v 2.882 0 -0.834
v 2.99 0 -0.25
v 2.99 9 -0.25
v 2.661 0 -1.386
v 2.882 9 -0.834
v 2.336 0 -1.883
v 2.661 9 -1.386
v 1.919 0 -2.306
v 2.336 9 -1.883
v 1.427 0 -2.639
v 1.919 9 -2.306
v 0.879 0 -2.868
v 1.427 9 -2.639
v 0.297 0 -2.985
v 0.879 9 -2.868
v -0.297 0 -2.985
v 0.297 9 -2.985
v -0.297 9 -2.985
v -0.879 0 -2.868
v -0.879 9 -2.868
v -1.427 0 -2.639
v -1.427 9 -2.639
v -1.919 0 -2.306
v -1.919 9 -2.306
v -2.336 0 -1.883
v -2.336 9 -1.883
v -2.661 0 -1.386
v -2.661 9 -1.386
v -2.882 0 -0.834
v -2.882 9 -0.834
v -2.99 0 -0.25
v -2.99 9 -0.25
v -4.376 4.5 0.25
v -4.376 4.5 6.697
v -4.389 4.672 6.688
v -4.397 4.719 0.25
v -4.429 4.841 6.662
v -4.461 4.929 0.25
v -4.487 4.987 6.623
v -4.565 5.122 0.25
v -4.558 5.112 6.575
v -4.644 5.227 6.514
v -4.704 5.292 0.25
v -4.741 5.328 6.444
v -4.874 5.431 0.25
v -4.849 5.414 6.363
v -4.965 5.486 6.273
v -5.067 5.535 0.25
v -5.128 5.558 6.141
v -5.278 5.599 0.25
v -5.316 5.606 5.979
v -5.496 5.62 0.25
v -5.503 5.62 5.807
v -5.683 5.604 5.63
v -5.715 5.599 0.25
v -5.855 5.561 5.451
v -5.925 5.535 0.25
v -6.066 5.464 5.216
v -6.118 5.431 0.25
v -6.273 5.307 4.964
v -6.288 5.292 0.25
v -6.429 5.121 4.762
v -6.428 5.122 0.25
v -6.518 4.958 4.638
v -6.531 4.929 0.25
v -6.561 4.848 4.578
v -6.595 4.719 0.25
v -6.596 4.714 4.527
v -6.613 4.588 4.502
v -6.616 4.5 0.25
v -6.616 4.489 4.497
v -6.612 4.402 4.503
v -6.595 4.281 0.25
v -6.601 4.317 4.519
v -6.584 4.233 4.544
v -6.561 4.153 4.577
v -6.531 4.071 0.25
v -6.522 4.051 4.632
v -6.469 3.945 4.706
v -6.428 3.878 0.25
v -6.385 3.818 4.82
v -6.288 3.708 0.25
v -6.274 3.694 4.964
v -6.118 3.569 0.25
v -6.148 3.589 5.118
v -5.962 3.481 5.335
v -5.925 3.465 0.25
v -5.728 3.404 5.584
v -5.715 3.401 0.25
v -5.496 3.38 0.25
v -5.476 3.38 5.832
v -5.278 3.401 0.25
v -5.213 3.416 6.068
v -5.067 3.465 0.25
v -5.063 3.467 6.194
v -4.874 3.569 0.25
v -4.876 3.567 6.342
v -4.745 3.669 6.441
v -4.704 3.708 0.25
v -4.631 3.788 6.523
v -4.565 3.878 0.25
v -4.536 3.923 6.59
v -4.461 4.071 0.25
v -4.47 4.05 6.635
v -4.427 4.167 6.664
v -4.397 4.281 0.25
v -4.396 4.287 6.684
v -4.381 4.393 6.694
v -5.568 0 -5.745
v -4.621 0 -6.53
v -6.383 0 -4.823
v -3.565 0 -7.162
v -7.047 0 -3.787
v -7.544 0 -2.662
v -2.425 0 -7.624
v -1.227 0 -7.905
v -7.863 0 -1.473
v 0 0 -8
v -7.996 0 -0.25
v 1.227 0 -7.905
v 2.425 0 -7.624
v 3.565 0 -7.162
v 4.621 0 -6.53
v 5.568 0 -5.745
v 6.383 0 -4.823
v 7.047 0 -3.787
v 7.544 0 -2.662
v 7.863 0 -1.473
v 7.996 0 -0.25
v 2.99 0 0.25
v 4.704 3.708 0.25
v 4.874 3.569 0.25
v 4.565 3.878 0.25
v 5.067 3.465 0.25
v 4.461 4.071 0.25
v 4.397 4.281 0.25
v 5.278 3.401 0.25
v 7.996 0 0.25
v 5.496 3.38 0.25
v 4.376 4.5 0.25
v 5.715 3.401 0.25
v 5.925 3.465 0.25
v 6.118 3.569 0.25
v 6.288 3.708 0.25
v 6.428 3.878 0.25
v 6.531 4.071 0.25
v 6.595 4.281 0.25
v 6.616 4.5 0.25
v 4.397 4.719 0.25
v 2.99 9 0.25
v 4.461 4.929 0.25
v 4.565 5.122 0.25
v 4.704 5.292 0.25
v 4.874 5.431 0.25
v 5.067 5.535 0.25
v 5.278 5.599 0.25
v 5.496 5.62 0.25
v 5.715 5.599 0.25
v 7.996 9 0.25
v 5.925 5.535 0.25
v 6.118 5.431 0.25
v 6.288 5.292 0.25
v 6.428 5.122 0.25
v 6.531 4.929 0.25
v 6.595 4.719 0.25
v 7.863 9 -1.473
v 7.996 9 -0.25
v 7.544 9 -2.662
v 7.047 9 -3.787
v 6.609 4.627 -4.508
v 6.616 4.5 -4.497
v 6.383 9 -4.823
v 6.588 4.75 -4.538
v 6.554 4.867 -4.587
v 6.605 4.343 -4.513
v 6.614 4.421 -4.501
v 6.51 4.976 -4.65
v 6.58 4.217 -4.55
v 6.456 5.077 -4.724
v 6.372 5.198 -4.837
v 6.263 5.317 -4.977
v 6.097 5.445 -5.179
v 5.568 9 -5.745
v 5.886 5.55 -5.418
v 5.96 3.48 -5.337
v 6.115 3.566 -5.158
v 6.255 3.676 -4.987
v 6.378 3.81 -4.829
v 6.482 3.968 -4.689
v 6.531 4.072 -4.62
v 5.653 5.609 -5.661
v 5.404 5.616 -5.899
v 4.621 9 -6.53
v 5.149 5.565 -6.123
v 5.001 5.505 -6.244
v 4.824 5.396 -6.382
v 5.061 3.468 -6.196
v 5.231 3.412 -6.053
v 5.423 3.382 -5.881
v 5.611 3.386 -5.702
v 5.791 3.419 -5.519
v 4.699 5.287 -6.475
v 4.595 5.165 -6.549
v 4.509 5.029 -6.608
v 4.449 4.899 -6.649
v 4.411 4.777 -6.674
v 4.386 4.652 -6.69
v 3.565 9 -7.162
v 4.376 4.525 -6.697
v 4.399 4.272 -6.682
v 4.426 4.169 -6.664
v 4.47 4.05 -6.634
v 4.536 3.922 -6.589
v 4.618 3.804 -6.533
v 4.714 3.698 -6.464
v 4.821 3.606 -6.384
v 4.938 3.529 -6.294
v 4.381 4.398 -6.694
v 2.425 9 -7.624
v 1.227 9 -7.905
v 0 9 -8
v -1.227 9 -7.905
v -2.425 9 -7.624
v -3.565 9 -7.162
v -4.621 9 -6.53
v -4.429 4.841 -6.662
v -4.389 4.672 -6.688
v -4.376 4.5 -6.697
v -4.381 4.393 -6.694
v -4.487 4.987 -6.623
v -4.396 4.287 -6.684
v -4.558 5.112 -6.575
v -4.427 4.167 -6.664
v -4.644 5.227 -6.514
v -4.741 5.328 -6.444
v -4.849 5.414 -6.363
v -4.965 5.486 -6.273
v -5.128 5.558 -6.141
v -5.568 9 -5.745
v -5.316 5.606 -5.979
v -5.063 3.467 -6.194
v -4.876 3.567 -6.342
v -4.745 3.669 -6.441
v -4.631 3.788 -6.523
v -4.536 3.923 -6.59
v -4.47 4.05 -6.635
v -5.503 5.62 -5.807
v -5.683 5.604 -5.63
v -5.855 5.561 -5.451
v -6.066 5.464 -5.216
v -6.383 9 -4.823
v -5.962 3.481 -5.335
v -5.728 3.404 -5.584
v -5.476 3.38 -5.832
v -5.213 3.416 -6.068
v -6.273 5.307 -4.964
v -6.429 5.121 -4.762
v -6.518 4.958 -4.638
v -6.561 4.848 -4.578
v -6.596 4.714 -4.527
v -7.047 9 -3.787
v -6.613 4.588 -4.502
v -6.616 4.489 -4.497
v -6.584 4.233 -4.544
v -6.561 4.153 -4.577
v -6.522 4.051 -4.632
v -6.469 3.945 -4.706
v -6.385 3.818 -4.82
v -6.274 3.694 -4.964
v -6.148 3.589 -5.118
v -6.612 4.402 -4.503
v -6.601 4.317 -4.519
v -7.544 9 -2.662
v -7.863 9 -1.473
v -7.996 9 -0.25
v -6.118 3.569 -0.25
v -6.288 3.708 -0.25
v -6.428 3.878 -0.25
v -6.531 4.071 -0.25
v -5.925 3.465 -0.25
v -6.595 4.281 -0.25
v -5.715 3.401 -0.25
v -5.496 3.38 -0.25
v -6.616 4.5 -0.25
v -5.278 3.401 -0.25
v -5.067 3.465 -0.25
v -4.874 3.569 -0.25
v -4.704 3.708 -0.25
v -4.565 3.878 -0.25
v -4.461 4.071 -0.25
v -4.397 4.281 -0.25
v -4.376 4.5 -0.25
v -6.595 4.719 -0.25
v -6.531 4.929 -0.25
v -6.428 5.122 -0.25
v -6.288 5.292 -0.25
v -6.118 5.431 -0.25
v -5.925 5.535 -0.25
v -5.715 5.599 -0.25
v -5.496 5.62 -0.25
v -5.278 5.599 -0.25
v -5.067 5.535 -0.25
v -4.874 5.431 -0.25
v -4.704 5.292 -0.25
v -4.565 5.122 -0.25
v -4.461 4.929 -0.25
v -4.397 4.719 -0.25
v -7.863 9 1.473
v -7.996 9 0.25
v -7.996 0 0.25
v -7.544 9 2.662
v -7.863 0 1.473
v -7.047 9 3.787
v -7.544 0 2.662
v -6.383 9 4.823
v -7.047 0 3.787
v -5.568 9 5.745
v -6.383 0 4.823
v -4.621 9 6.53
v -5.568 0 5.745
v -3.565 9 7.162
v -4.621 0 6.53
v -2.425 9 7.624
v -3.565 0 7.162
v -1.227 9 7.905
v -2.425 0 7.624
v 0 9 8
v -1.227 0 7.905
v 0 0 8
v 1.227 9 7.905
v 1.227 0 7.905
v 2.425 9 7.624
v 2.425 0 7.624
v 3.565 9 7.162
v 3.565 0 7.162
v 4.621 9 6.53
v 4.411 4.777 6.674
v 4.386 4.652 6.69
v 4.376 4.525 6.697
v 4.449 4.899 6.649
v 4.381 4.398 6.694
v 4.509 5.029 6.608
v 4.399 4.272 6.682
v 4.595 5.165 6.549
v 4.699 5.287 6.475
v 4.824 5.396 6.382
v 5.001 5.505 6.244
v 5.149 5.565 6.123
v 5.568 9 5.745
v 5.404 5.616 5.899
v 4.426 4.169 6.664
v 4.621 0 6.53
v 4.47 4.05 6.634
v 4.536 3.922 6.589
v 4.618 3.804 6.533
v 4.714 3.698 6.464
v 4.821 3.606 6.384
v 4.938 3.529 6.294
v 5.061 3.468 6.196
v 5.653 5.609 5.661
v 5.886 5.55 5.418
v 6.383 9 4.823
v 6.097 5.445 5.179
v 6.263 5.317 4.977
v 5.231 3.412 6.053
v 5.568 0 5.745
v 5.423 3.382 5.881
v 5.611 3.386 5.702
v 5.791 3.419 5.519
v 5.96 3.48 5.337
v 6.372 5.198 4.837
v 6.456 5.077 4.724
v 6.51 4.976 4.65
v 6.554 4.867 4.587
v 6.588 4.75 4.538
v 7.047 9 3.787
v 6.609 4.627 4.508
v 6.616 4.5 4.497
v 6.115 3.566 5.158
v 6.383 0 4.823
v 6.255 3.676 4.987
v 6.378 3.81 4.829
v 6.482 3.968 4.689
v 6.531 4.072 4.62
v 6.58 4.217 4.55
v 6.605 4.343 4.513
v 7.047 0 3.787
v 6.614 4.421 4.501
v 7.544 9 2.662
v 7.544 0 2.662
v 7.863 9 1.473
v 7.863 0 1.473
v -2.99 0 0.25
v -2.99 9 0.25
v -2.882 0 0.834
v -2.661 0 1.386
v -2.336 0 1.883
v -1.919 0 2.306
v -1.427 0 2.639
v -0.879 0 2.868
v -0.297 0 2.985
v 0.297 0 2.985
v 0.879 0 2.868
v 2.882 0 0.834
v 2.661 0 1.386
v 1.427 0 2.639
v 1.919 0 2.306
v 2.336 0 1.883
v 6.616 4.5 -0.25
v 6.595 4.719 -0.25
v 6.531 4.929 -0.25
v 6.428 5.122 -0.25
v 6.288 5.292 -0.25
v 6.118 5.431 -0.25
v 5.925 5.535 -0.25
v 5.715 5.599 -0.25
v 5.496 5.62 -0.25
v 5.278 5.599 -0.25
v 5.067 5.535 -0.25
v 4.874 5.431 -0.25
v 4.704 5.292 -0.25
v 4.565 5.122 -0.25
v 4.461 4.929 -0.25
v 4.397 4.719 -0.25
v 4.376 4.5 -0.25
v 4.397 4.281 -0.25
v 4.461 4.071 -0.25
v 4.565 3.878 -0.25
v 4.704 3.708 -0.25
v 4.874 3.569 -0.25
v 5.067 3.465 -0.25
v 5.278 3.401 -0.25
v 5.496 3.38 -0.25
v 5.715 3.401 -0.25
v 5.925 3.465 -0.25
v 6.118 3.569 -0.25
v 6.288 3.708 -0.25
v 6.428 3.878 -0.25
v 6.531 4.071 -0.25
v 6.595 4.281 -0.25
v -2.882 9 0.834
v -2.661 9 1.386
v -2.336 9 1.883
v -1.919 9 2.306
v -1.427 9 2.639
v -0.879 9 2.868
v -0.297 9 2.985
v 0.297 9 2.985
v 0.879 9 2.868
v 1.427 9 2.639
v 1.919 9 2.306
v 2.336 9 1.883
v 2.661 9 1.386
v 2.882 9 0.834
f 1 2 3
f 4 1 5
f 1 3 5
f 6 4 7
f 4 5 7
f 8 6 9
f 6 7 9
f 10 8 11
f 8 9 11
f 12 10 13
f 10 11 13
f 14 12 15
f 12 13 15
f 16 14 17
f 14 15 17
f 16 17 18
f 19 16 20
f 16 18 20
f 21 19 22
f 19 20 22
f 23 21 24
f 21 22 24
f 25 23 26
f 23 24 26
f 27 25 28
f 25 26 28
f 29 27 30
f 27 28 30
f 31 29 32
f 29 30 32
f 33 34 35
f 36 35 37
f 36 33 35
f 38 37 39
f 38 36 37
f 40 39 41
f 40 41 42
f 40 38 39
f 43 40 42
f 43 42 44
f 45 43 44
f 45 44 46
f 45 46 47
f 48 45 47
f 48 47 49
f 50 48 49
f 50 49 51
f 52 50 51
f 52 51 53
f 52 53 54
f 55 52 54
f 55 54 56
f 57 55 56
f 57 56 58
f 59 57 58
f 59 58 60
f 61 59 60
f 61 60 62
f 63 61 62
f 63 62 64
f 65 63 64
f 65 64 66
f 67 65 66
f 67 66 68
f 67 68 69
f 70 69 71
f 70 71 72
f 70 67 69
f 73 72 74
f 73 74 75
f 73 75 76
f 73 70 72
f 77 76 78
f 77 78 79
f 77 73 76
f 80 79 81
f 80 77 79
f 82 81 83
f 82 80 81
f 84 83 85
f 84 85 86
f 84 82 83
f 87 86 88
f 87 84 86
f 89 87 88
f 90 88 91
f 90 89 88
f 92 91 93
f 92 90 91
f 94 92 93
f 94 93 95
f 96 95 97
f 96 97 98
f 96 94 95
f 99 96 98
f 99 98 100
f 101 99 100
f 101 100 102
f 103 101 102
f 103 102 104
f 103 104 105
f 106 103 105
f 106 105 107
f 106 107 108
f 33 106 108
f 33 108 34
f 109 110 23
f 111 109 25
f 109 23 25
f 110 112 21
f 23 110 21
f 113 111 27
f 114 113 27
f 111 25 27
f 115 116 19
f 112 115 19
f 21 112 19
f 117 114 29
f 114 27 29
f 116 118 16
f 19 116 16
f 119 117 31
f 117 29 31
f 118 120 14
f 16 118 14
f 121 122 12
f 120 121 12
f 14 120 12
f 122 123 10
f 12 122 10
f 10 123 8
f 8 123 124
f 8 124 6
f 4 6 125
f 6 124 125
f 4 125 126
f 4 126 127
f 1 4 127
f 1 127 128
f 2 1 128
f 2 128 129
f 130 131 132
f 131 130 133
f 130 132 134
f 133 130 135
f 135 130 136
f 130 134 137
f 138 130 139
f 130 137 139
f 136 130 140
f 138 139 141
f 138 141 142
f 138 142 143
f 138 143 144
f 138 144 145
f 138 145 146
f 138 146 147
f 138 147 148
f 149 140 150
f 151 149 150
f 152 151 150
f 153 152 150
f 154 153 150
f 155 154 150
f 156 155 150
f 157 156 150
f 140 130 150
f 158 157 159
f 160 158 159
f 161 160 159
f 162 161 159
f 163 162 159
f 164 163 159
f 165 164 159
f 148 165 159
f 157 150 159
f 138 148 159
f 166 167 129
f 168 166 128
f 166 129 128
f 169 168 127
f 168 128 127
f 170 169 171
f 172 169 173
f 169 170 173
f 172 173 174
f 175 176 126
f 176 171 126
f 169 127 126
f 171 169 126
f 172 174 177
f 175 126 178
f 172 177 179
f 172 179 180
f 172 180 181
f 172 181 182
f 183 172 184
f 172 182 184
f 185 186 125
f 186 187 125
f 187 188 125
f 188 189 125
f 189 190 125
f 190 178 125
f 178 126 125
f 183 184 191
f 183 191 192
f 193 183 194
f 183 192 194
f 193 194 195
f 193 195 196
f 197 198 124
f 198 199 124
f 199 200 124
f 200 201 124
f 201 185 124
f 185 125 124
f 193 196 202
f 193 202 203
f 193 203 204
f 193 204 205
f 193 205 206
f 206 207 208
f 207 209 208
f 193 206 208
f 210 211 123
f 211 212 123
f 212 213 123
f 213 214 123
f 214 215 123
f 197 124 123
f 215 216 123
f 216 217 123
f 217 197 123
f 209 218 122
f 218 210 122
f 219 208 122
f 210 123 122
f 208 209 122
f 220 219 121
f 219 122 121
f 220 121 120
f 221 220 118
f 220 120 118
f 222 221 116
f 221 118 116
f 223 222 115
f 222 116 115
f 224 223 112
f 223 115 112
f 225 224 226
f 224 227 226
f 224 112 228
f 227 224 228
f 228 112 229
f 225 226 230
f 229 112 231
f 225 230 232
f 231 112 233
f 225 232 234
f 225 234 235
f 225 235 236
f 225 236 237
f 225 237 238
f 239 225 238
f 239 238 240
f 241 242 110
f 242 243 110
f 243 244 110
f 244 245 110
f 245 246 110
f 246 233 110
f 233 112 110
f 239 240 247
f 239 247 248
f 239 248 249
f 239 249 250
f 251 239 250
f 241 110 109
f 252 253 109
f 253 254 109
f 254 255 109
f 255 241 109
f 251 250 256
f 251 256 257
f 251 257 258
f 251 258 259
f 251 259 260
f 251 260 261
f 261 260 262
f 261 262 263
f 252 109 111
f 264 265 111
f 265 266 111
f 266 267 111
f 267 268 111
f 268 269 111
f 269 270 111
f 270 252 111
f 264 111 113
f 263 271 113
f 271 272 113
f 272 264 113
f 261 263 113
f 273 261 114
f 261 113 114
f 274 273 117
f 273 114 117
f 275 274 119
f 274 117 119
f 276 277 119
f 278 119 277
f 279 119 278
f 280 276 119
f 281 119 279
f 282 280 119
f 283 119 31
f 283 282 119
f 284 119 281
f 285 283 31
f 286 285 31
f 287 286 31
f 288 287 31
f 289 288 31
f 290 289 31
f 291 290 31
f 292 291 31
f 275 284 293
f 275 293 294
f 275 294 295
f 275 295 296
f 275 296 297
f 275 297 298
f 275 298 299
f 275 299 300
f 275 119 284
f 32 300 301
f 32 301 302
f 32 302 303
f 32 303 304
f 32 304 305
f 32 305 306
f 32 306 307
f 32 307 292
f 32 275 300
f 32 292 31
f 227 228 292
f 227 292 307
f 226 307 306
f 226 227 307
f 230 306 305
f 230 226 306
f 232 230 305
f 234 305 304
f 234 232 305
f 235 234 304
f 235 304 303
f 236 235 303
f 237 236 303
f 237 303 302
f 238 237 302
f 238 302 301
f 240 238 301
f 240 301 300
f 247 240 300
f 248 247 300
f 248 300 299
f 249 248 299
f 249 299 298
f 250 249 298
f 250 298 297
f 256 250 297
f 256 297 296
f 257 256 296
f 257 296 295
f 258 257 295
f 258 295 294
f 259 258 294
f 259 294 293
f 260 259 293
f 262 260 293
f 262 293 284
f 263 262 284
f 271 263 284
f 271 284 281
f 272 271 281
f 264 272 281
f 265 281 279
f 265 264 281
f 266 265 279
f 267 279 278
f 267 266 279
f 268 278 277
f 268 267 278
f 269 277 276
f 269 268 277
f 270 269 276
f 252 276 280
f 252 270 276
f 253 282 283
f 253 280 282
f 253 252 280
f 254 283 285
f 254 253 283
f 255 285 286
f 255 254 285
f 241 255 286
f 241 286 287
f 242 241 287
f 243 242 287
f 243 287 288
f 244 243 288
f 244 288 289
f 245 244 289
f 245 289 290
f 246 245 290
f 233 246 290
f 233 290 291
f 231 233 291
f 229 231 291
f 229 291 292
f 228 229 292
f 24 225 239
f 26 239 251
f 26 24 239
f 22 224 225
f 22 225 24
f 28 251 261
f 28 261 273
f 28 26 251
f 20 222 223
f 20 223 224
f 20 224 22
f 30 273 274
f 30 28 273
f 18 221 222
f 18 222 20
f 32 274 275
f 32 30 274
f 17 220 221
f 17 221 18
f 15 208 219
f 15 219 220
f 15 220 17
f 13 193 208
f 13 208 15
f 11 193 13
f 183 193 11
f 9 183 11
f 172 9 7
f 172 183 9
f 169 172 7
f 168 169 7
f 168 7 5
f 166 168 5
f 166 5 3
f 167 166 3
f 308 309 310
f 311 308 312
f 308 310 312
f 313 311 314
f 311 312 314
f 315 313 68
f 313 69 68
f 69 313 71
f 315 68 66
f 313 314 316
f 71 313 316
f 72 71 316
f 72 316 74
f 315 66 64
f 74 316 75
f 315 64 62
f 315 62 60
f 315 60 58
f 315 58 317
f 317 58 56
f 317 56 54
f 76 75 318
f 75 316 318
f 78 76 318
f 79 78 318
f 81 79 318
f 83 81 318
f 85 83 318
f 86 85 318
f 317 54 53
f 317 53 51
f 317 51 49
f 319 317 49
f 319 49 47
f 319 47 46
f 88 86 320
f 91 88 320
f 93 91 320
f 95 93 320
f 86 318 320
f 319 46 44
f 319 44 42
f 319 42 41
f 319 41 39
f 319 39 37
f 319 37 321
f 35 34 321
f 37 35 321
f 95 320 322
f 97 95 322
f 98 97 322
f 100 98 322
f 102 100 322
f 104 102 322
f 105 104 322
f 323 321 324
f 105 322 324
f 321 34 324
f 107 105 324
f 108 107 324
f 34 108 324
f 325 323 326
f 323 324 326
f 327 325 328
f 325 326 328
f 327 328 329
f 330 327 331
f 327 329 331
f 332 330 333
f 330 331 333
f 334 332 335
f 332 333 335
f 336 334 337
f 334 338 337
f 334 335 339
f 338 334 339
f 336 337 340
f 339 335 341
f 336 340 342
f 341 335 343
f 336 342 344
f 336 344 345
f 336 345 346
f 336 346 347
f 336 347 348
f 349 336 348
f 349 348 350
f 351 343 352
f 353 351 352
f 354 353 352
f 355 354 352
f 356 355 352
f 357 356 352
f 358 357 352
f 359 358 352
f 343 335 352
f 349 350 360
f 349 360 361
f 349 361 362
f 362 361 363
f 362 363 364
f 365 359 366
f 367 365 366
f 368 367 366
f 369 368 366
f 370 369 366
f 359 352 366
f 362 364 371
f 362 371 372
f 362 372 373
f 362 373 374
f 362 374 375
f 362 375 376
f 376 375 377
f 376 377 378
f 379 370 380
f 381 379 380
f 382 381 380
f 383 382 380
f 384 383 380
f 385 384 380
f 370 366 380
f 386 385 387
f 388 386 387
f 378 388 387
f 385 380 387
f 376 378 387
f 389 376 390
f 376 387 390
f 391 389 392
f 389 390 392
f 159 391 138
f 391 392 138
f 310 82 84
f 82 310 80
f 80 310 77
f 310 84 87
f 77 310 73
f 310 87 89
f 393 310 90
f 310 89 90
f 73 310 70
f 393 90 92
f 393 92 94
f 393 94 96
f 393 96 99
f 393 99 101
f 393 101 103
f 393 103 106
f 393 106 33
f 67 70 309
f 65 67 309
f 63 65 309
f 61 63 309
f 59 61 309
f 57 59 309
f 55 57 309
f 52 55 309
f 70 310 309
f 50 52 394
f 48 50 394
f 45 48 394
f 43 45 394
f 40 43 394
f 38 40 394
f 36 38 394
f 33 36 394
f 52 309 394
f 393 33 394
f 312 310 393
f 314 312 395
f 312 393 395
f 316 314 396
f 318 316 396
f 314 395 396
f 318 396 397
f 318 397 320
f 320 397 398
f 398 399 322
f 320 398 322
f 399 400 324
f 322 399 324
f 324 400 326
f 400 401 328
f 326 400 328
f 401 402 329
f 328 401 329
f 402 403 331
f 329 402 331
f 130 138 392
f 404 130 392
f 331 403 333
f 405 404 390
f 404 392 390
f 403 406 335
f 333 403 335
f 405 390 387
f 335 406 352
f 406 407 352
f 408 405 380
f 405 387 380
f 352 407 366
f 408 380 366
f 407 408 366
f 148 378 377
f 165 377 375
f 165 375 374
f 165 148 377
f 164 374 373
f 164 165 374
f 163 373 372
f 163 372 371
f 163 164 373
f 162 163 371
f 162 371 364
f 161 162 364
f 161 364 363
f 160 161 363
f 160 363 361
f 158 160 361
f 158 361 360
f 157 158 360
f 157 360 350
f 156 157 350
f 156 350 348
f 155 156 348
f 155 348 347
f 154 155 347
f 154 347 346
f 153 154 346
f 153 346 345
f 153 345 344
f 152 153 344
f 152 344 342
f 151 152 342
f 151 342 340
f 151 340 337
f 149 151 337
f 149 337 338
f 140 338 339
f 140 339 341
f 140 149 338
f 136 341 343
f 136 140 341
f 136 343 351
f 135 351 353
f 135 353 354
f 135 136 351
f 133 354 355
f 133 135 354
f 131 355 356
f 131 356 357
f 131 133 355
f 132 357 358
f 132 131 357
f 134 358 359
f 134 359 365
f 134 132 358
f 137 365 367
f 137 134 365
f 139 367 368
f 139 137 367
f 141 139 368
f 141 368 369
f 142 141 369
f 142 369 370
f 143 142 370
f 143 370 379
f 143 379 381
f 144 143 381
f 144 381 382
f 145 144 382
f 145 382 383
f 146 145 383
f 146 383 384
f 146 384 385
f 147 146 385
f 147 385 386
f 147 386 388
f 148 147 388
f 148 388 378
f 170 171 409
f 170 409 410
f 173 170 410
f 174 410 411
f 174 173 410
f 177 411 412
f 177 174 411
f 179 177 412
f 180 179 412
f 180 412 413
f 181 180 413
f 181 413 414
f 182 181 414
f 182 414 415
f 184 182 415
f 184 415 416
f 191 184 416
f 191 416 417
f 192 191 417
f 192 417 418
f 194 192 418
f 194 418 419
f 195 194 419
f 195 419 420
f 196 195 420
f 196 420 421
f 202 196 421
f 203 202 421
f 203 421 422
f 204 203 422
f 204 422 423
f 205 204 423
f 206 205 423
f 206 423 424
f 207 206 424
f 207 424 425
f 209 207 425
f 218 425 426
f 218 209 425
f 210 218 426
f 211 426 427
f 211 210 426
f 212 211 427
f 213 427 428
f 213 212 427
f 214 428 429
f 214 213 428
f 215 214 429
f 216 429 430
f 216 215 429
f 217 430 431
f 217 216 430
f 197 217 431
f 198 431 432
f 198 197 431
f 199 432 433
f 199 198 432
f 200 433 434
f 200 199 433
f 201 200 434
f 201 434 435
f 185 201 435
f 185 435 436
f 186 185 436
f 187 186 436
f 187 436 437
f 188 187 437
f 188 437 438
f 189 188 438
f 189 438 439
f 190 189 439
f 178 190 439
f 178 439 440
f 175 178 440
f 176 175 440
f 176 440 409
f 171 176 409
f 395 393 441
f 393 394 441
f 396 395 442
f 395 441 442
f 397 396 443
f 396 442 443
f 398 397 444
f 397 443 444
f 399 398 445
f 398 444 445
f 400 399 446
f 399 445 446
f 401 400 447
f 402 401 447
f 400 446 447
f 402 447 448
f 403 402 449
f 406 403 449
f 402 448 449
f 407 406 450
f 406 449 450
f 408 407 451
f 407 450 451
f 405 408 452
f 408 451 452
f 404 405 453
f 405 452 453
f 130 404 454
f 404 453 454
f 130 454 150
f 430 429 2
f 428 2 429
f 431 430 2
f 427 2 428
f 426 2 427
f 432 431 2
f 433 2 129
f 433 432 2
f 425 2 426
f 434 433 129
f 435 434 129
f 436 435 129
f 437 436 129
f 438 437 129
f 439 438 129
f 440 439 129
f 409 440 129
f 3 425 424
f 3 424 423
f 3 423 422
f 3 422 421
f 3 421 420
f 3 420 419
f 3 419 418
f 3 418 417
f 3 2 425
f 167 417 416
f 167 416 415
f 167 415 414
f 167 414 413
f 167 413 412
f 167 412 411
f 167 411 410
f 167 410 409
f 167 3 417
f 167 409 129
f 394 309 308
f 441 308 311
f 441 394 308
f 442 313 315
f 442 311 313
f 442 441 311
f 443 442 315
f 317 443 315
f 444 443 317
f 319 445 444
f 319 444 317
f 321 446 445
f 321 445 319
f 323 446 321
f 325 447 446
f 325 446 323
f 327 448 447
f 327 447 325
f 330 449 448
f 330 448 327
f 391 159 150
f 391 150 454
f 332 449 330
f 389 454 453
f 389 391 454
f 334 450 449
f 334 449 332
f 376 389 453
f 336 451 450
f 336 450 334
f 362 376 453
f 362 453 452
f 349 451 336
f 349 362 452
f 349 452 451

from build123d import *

# Parameters (mm, degrees)
SKETCH_1_R               = 8
EXTRUDE_1_DEPTH          = 9
SKETCH_3_R               = 3
CUT_EXTRUDE_2_DEPTH      = 15.456832295
SKETCH_5_W               = 20
SKETCH_5_H               = 0.5
CUT_EXTRUDE_4_DEPTH      = 15.456832295
CUT_EXTRUDE_5_DEPTH      = 15.454670525
CUT_EXTRUDE_5_DEPTH_BACK = 15.454670525
SKETCH_6_R               = 1.12021095


with BuildPart() as part:
    # 草图1 → 凸台-拉伸1 (new body)
    with BuildSketch(Plane(origin=(0, 0, 0), x_dir=(1, 0, 0), z_dir=(0, 1, 0))):
        with Locations(Location((0, 0, 0), (0, 0, 270))):
            Circle(SKETCH_1_R)
    extrude(amount=EXTRUDE_1_DEPTH)

    # 草图3 → 切除-拉伸2 (cut, through all)
    with BuildSketch(Plane(origin=(0, 9, 0), x_dir=(1, 0, 0), z_dir=(0, 1, 0))):
        with Locations(Location((0, 0, 0), (0, 0, 270))):
            Circle(SKETCH_3_R)
    extrude(amount=-CUT_EXTRUDE_2_DEPTH, mode=Mode.SUBTRACT)

    # 草图5 → 切除-拉伸4 (cut, through all)
    with BuildSketch(Plane(origin=(0, 9, 0), x_dir=(1, 0, 0), z_dir=(0, 1, 0))):
        Rectangle(SKETCH_5_W, SKETCH_5_H)
    extrude(amount=-CUT_EXTRUDE_4_DEPTH, mode=Mode.SUBTRACT)


with BuildPart() as cut_extrude_4_piece_1:
    # of the separate pieces the step leaves, piece 1, a body of its own (cut_extrude_4_pieces)
    add(part.part.solids().sort_by_distance((-7.996092796, 0, 0.25))[0])


with BuildPart() as cut_extrude_4_piece_2:
    # of the separate pieces the step leaves, piece 2, a body of its own (cut_extrude_4_pieces)
    add(part.part.solids().sort_by_distance((7.996092796, 0, -0.25))[0])


with BuildPart() as cut_extrude_5_tool:
    # 草图6 → 切除-拉伸5 (new, two sides: drawn at the far end of the back side and taken through both)
    with BuildSketch(Plane.XY.offset(-CUT_EXTRUDE_5_DEPTH_BACK)):
        with Locations((5.496092796, 4.5)):
            Circle(SKETCH_6_R)
        with Locations((-5.496092796, 4.5)):
            Circle(SKETCH_6_R)
    extrude(amount=CUT_EXTRUDE_5_DEPTH + CUT_EXTRUDE_5_DEPTH_BACK)


with BuildPart() as cut_extrude_4_piece_1_1:
    add(cut_extrude_4_piece_1.part)

    # 切除-拉伸5: cut by cut_extrude_5_tool
    add(cut_extrude_5_tool.part, mode=Mode.SUBTRACT)


with BuildPart() as cut_extrude_4_piece_2_1:
    add(cut_extrude_4_piece_2.part)

    # 切除-拉伸5: cut by cut_extrude_5_tool
    add(cut_extrude_5_tool.part, mode=Mode.SUBTRACT)


solid = Compound([cut_extrude_4_piece_1_1.part, cut_extrude_4_piece_2_1.part])
